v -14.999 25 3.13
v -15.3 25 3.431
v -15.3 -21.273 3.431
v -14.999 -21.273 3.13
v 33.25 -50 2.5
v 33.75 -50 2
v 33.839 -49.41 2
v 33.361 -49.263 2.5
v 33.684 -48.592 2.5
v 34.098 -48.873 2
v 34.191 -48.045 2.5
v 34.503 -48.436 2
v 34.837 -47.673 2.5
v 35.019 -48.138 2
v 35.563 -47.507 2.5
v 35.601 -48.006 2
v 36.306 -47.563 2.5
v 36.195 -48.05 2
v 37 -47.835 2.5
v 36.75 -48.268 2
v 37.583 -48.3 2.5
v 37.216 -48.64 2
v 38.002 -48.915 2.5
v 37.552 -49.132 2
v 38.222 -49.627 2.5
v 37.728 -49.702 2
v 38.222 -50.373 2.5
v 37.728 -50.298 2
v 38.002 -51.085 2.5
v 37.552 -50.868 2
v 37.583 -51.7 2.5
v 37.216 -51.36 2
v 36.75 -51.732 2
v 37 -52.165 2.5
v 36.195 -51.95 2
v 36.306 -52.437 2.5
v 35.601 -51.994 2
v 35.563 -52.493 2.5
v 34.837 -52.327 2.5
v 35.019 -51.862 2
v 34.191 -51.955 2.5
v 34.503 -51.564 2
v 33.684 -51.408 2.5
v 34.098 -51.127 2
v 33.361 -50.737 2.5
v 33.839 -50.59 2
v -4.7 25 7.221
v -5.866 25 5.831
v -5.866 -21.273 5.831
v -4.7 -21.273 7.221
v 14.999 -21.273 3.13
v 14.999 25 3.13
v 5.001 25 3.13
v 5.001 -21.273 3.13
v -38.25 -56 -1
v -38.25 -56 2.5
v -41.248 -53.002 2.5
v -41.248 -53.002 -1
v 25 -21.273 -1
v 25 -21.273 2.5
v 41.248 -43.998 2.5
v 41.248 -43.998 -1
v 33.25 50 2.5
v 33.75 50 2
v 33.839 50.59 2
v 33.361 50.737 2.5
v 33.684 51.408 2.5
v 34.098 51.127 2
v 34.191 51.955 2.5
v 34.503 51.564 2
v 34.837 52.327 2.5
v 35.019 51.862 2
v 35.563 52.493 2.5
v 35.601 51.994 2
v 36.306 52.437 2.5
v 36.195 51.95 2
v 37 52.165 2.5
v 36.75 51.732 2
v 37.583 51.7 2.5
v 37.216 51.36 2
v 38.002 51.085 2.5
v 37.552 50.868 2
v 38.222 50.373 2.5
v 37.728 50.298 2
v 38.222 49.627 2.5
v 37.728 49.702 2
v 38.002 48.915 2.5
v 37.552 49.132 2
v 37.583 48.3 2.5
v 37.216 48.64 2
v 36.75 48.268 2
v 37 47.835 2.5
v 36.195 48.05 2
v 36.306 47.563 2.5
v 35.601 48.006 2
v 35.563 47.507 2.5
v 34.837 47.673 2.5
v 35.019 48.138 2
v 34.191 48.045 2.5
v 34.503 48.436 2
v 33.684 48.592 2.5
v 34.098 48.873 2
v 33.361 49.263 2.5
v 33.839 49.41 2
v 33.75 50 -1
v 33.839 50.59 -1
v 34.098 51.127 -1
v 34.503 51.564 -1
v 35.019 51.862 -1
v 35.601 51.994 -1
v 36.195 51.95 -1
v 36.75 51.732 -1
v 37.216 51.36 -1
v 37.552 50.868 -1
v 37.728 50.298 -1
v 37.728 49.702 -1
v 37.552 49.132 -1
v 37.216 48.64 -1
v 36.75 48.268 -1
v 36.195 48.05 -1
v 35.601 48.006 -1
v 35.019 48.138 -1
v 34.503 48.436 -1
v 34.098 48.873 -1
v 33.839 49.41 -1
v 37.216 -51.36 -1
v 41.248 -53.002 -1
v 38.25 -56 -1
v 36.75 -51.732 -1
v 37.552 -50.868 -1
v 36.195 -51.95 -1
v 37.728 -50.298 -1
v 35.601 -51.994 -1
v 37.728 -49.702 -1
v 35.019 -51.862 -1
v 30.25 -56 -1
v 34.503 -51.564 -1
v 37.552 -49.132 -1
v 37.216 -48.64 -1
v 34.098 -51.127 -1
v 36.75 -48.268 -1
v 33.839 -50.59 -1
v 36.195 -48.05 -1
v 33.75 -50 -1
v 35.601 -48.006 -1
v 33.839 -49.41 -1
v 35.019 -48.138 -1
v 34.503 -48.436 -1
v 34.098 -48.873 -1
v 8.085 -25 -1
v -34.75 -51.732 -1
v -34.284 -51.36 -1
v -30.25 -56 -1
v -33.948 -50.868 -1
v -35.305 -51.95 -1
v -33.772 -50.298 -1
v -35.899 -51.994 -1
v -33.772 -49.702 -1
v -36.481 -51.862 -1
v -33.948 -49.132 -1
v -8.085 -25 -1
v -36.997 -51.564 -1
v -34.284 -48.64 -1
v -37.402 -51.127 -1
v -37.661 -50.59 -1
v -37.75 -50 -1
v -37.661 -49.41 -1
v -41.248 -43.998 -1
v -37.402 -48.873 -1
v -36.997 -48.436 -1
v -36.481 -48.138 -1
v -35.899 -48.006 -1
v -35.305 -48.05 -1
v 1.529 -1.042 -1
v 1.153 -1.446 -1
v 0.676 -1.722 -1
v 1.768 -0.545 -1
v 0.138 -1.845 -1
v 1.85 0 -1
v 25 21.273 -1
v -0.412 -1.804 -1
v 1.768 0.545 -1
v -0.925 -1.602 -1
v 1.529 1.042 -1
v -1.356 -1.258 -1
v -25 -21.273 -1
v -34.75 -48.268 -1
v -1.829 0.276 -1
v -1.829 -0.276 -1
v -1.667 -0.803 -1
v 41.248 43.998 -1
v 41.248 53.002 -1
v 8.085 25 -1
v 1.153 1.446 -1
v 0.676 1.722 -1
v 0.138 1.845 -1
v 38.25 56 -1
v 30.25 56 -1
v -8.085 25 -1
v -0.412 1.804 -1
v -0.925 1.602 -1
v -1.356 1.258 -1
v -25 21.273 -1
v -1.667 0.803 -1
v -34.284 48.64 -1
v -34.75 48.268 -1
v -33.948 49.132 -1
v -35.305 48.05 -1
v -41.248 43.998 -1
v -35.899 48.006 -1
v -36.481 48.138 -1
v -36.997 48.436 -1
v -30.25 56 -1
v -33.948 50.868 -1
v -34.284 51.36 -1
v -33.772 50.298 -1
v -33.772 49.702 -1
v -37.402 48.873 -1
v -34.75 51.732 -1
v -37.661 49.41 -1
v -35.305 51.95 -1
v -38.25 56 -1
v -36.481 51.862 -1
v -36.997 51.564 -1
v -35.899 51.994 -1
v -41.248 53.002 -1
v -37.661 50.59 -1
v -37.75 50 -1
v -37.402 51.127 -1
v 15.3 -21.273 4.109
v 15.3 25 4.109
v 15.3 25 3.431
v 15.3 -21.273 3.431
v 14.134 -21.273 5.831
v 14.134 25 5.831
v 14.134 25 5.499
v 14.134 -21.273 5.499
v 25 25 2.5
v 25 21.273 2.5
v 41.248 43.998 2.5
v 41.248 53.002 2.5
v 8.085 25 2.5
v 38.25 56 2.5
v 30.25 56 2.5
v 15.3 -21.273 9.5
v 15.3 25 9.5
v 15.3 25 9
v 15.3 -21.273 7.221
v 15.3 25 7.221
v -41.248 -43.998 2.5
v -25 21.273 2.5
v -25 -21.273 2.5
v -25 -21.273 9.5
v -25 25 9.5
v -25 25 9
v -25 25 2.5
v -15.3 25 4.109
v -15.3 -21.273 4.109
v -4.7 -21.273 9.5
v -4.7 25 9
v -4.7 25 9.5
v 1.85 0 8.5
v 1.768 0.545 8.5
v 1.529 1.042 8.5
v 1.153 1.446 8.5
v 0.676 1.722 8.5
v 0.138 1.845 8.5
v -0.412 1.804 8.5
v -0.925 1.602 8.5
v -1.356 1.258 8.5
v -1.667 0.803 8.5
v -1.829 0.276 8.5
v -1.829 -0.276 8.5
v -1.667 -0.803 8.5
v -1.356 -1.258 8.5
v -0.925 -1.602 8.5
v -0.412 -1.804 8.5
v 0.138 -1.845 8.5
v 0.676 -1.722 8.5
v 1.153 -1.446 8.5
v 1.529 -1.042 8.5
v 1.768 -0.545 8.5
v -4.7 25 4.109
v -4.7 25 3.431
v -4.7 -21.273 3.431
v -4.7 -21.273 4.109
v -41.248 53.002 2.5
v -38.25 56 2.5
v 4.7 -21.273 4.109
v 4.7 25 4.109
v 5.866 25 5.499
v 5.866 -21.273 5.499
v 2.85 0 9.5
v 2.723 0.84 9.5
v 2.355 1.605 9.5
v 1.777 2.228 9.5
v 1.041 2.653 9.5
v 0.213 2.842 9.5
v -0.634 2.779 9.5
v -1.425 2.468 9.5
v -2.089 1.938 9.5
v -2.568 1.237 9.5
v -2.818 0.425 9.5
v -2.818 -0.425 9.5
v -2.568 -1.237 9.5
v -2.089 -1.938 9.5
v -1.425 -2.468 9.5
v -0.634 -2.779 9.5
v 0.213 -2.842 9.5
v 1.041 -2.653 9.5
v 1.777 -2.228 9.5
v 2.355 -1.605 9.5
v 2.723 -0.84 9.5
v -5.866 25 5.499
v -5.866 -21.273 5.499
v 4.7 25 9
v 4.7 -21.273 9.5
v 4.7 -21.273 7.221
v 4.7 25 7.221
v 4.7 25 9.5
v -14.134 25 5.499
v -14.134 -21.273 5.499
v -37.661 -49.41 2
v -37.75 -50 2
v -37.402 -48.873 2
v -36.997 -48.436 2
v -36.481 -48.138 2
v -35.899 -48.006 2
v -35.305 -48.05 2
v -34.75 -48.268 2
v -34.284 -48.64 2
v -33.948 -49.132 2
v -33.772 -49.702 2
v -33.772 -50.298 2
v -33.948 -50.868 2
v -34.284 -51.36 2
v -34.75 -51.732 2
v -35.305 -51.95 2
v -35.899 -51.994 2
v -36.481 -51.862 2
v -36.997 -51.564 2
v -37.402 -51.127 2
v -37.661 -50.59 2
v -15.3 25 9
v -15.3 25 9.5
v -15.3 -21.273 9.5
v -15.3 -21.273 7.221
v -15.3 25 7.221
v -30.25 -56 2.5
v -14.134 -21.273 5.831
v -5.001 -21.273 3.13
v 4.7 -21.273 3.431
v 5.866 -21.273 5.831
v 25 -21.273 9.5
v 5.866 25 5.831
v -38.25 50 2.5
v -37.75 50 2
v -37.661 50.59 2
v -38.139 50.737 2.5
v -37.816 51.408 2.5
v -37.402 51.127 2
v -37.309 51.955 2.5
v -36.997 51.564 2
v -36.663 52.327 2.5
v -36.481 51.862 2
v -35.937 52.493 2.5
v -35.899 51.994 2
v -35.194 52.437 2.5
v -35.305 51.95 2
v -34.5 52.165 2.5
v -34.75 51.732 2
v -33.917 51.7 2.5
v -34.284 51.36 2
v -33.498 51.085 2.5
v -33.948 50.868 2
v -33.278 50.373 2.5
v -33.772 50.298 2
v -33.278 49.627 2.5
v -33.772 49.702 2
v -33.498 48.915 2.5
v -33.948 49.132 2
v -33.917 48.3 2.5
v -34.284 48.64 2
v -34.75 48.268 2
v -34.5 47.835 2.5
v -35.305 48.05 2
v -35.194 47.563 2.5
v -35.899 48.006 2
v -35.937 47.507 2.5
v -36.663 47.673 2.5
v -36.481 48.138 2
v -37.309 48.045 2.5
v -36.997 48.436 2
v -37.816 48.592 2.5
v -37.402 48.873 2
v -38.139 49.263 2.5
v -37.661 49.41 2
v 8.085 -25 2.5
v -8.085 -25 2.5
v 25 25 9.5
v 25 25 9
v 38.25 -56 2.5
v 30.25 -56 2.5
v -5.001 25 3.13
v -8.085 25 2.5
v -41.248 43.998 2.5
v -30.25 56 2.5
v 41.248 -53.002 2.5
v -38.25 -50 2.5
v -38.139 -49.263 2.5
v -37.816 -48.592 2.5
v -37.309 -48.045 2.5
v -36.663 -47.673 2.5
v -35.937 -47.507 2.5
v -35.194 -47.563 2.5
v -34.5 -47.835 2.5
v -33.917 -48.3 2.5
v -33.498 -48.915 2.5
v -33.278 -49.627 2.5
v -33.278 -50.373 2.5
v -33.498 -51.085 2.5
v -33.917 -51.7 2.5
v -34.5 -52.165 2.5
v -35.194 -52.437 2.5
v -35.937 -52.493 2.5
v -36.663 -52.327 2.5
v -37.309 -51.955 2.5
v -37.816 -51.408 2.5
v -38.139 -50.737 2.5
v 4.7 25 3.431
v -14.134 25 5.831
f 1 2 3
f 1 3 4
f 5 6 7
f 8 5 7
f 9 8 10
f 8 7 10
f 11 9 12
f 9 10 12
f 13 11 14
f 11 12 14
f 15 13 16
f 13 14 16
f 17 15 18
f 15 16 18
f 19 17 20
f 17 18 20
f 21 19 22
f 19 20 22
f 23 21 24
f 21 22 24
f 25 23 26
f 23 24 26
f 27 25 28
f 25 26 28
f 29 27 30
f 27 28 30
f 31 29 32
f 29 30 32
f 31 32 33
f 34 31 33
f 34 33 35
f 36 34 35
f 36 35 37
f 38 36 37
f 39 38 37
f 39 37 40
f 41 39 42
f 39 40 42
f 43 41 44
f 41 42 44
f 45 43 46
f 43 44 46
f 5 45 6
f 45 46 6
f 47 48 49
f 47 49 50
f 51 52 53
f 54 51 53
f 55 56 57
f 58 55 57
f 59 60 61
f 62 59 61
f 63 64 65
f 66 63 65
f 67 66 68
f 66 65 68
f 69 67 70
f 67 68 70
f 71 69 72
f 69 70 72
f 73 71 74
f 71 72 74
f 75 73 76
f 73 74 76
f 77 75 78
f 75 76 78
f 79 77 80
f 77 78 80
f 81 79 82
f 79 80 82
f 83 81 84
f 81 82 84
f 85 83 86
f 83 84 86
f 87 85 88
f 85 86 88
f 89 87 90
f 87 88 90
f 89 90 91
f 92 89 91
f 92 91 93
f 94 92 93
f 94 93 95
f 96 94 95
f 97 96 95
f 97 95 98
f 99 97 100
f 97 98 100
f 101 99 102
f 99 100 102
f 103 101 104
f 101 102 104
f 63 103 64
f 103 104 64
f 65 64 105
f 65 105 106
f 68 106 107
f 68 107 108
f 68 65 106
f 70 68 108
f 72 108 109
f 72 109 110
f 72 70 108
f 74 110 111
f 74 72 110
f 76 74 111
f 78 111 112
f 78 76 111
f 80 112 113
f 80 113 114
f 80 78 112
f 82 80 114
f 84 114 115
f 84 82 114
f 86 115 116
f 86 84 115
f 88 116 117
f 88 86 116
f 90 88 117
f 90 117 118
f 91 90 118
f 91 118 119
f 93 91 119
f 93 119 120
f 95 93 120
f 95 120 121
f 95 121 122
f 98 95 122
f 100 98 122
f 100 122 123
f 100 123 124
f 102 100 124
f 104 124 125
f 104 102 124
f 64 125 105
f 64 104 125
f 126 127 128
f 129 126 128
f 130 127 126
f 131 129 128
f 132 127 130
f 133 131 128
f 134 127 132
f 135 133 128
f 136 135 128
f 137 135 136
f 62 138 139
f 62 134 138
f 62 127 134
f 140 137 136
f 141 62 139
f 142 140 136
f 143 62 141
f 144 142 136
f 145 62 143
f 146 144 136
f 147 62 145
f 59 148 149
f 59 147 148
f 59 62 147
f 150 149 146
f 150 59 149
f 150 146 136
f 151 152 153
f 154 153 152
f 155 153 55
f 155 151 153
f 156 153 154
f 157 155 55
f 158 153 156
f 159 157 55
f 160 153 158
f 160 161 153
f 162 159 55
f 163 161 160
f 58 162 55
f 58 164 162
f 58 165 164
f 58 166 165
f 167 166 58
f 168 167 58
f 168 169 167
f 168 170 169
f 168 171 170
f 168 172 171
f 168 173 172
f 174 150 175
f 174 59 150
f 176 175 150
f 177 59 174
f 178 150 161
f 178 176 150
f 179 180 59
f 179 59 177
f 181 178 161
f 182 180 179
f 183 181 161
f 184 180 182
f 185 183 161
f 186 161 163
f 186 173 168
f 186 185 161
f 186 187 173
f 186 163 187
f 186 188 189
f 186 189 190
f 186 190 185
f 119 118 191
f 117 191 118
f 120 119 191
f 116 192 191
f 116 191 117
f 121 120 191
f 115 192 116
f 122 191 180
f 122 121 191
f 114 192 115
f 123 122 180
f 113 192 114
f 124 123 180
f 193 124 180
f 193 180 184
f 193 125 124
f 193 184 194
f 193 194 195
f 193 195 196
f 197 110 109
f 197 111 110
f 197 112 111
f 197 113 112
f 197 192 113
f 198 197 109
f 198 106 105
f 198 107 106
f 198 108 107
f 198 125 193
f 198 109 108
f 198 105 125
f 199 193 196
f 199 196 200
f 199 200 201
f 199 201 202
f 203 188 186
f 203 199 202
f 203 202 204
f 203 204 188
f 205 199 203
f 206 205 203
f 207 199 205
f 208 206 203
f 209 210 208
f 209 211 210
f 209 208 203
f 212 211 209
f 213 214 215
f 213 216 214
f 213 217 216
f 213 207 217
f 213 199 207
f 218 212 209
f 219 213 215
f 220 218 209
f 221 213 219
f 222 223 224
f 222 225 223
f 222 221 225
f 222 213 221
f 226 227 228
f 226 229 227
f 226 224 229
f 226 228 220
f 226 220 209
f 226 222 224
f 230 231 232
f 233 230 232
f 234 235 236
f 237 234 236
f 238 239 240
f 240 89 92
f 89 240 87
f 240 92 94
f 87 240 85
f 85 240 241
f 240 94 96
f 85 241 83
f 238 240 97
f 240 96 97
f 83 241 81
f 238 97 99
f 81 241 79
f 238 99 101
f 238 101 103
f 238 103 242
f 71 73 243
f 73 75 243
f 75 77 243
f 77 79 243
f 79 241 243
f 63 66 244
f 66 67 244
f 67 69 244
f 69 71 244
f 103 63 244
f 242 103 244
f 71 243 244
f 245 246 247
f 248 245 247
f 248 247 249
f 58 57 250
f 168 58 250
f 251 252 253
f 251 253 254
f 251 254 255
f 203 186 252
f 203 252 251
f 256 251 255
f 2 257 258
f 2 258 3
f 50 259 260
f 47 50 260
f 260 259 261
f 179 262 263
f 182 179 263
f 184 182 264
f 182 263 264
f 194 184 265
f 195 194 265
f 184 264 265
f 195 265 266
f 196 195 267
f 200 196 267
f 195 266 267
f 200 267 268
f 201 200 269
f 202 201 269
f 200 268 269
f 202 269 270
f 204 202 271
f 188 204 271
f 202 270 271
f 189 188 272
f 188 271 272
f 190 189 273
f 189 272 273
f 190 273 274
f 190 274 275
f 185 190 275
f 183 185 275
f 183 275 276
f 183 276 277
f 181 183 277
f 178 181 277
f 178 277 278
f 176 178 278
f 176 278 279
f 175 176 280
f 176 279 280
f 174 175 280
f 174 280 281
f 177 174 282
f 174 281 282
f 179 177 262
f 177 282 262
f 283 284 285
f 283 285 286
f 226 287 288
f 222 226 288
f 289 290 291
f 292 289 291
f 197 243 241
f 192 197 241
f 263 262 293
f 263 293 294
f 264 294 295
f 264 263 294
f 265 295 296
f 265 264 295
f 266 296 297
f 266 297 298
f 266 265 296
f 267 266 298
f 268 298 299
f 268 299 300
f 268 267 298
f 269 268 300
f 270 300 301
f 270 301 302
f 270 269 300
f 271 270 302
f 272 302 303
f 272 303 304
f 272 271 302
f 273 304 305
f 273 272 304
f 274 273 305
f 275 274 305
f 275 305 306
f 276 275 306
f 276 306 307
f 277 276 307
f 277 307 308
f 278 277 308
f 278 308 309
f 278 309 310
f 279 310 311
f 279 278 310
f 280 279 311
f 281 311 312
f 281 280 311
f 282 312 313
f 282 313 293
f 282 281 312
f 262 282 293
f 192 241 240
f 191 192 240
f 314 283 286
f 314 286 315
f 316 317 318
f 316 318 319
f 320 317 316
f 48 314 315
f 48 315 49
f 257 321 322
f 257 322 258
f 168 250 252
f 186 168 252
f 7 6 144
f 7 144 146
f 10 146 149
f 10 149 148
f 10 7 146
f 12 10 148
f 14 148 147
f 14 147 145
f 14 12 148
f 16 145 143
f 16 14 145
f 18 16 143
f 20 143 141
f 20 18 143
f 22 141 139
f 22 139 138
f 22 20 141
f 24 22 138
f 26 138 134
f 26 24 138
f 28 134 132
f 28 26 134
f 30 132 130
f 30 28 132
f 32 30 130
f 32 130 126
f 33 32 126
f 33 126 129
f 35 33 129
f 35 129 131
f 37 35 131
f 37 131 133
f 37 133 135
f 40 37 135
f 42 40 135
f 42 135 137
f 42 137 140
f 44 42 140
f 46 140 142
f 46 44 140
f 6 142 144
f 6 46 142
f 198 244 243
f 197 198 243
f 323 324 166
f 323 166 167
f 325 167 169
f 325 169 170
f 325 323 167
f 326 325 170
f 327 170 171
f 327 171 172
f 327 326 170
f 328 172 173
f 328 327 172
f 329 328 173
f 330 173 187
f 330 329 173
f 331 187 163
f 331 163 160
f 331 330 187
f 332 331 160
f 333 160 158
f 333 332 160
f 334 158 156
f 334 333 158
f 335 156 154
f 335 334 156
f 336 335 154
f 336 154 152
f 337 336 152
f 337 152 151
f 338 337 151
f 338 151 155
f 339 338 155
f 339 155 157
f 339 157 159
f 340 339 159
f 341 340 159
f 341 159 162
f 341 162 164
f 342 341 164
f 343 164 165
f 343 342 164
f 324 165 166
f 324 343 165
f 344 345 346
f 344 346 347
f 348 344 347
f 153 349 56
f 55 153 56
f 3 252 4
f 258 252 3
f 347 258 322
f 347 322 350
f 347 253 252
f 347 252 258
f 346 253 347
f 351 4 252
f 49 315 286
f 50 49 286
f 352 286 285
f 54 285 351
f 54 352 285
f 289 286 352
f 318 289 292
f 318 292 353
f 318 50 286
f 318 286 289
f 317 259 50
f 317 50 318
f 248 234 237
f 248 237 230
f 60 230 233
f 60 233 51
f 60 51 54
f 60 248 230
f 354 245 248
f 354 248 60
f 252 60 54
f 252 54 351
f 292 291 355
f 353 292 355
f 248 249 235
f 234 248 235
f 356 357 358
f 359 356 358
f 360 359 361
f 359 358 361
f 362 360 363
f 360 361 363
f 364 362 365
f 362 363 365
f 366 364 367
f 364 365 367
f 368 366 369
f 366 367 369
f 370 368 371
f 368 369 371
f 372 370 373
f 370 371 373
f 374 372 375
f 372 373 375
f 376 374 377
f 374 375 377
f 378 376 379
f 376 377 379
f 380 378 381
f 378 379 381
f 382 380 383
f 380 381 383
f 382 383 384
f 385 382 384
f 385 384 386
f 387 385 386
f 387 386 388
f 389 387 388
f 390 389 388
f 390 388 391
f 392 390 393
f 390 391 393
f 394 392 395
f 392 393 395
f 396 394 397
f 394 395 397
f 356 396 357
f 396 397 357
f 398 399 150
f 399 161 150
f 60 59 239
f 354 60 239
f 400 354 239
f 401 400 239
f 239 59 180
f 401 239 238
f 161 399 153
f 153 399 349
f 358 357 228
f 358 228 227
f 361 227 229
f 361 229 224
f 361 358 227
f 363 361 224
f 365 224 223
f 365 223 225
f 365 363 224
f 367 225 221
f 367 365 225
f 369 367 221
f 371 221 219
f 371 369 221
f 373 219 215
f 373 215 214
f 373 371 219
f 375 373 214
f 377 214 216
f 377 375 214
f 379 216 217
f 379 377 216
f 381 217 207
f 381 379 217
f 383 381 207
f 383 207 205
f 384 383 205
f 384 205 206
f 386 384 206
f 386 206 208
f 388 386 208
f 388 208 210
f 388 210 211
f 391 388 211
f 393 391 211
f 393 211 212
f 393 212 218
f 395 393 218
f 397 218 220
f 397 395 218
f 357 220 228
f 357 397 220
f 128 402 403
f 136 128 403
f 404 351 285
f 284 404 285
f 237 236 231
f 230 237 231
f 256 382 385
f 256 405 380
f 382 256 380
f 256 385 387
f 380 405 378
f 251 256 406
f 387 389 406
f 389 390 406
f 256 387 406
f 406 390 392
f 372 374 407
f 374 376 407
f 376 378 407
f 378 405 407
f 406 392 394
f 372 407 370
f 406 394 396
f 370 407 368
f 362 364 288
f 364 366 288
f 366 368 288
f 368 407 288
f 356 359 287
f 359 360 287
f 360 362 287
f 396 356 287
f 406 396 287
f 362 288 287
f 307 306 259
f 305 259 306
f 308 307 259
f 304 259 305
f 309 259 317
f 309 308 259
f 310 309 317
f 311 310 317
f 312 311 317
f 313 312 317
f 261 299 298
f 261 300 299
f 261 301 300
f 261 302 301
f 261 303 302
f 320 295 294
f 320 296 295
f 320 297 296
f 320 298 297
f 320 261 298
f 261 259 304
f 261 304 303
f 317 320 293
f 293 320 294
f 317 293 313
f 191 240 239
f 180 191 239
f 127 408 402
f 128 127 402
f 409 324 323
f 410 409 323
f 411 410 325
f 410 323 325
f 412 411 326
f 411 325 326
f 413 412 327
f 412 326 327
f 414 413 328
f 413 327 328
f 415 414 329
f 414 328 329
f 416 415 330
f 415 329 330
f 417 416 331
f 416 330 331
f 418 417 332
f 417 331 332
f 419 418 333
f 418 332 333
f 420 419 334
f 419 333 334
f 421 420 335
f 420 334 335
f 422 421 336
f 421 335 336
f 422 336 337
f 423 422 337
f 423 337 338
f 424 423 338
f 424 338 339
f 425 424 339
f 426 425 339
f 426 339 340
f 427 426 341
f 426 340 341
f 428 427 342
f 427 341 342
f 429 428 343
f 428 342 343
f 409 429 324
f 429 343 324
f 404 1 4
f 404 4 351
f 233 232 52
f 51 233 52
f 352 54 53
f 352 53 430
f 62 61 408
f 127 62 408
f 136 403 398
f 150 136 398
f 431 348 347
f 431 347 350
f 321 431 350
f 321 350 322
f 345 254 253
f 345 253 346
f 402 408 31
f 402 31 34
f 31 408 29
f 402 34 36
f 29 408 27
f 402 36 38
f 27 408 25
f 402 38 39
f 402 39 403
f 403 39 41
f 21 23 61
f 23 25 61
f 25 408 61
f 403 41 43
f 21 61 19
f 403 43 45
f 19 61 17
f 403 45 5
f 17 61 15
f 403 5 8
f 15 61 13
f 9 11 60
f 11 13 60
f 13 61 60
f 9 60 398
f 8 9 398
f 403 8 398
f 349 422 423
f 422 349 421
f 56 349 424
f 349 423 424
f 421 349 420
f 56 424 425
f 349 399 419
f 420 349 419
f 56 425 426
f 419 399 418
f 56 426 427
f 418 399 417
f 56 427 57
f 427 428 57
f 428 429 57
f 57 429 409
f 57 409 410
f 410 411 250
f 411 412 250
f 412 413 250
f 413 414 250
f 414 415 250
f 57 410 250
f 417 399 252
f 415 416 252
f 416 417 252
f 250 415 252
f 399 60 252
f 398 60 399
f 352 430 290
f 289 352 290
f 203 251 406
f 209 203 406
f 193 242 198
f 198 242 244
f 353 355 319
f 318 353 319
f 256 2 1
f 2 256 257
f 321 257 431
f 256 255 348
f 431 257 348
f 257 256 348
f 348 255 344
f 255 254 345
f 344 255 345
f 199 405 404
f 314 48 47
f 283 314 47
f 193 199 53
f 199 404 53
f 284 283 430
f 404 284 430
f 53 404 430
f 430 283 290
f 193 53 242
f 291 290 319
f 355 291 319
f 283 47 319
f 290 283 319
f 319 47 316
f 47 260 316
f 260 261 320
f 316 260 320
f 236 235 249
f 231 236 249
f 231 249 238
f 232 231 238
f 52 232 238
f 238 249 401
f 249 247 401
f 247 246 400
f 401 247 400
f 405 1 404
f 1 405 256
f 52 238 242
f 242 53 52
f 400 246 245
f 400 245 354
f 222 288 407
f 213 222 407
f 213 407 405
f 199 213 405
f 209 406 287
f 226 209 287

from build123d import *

# Parameters (mm, degrees)
SKICA1_W                     = 50
SKICA1_H                     = 50
P_IDAT_VYSUNUT_M1_DEPTH      = 10
ODEBRAT_VYSUNUT_M2_DEPTH     = 57.789083458
P_IDAT_VYSUNUT_M4_DEPTH      = 1
P_IDAT_VYSUNUT_M4_DEPTH_BACK = 2.5
SKICA4_R                     = 2
SKICA4_W                     = 50
SKICA4_H                     = 50
SKICA6_R                     = 1.85
ODEBRAT_VYSUNUT_M3_DEPTH     = 71.416176377
SKICA7_W                     = 50
SKICA7_H                     = 1
ODEBRAT_VYSUNUT_M4_DEPTH     = 92.446366224
SKICA9_W                     = 6.5
SKICA9_H                     = 3.727272727
ODEBRAT_VYSUNUT_M6_DEPTH     = 88.211595424
ZKOSEN_2_SIZE                = 0.5
P_IDAT_START                 = 0.5
SKICA10_W                    = 9.4
SKICA10_H                    = 46.272727273
SKICA10_R                    = 1.85
SKICA10_W_2                  = 9.7
P_IDAT_VYSUNUT_M5_DEPTH      = 0.5
ZKOSEN_3_SIZE                = 1


with BuildPart() as part:
    # Skica1 → Přidat vysunutím1 (new body)
    with BuildSketch(Plane.XY):
        Rectangle(SKICA1_W, SKICA1_H)
    extrude(amount=P_IDAT_VYSUNUT_M1_DEPTH)

    # Skica3 → Odebrat vysunutím2 (cut, through all)
    with BuildSketch(Plane(origin=(0, 25, 0), x_dir=(1, 0, 0), z_dir=(0, 1, 0))):
        Polygon((-15.3, -10), (-15.3, -7.22080893), (-14.133651513, -5.83080893), (-14.133651513, -5.49919107), (-15.3, -4.10919107), (-15.3, -3.430543964), (-14.999456036, -3.13), (-5.000543964, -3.13), (-4.7, -3.430543964), (-4.7, -4.10919107), (-5.866348487, -5.49919107), (-5.866348487, -5.83080893), (-4.7, -7.22080893), (-4.7, -10), align=None)
        Polygon((15.3, -3.430543964), (14.999456036, -3.13), (5.000543964, -3.13), (4.7, -3.430543964), (4.7, -4.10919107), (5.866348487, -5.49919107), (5.866348487, -5.83080893), (4.7, -7.22080893), (4.7, -10), (15.3, -10), (15.3, -7.22080893), (14.133651513, -5.83080893), (14.133651513, -5.49919107), (15.3, -4.10919107), align=None)
    extrude(amount=-ODEBRAT_VYSUNUT_M2_DEPTH, mode=Mode.SUBTRACT)

    # Skica4 → Přidat vysunutím4 (add, two sides: drawn at the far end of the back side and taken through both)
    # profile 1 of 5: a face of its own
    with BuildSketch(Plane(origin=(0, 0, 0), x_dir=(-1, 0, 0), z_dir=(0, 0, -1)).offset(-P_IDAT_VYSUNUT_M4_DEPTH_BACK)):
        Polygon((-30.25, -56), (-8.085, -25), (-25, -25), (-25, -21.272727273), (-41.248489616, -43.997887574), (-41.248489616, -46.002224154), (-41.248489616, -53.002224154), (-38.25, -56), align=None)
        with Locations((-35.75, -50)):
            Circle(SKICA4_R, mode=Mode.SUBTRACT)
    # profile 2 of 5: a face of its own
    with BuildSketch(Plane(origin=(0, 0, 0), x_dir=(-1, 0, 0), z_dir=(0, 0, -1)).offset(-P_IDAT_VYSUNUT_M4_DEPTH_BACK)):
        Rectangle(SKICA4_W, SKICA4_H)
    # profile 3 of 5: a face of its own
    with BuildSketch(Plane(origin=(0, 0, 0), x_dir=(-1, 0, 0), z_dir=(0, 0, -1)).offset(-P_IDAT_VYSUNUT_M4_DEPTH_BACK)):
        Polygon((-25, 25), (-8.085, 25), (-30.25, 56), (-38.25, 56), (-41.248489616, 53.002224154), (-41.248489616, 46.002224154), (-41.248489616, 43.997887574), (-25, 21.272727273), align=None)
        with Locations((-35.75, 50)):
            Circle(SKICA4_R, mode=Mode.SUBTRACT)
    # profile 4 of 5: a face of its own
    with BuildSketch(Plane(origin=(0, 0, 0), x_dir=(-1, 0, 0), z_dir=(0, 0, -1)).offset(-P_IDAT_VYSUNUT_M4_DEPTH_BACK)):
        Polygon((41.248489616, 46.002224154), (41.248489616, 53.002224154), (38.25, 56), (30.25, 56), (8.085, 25), (25, 25), (25, 21.272727273), (41.248489616, 43.997887574), align=None)
        with Locations((35.75, 50)):
            Circle(SKICA4_R, mode=Mode.SUBTRACT)
    # profile 5 of 5: a face of its own
    with BuildSketch(Plane(origin=(0, 0, 0), x_dir=(-1, 0, 0), z_dir=(0, 0, -1)).offset(-P_IDAT_VYSUNUT_M4_DEPTH_BACK)):
        Polygon((41.248489616, -43.997887574), (25, -21.272727273), (25, -25), (8.085, -25), (30.25, -56), (38.25, -56), (41.248489616, -53.002224154), (41.248489616, -46.002224154), align=None)
        with Locations((35.75, -50)):
            Circle(SKICA4_R, mode=Mode.SUBTRACT)
    extrude(amount=P_IDAT_VYSUNUT_M4_DEPTH + P_IDAT_VYSUNUT_M4_DEPTH_BACK)

    # Skica6 → Odebrat vysunutím3 (cut, through all)
    with BuildSketch(Plane.XY.offset(10)):
        Circle(SKICA6_R)
    extrude(amount=-ODEBRAT_VYSUNUT_M3_DEPTH, mode=Mode.SUBTRACT)

    # Skica7 → Odebrat vysunutím4 (cut, through all)
    with BuildSketch(Plane(origin=(0, 25, 0), x_dir=(1, 0, 0), z_dir=(0, 1, 0))):
        with Locations((0, -9.5)):
            Rectangle(SKICA7_W, SKICA7_H)
    extrude(amount=-ODEBRAT_VYSUNUT_M4_DEPTH, mode=Mode.SUBTRACT)

    # Skica9 → Odebrat vysunutím6 (cut, through all)
    with BuildSketch(Plane(origin=(25, 0, 0), x_dir=(0, 0, -1), z_dir=(1, 0, 0))):
        with Locations((-5.75, -23.136363637)):
            Rectangle(SKICA9_W, SKICA9_H)
    extrude(amount=-ODEBRAT_VYSUNUT_M6_DEPTH, mode=Mode.SUBTRACT)

    # Zkosení2
    zkosen_2_edges = [part.edges().sort_by_distance(p)[0] for p in [
        (-33.75, 50, 2.5),
        (37.75, -50, 2.5),
        (-33.75, -50, 2.5),
        (37.75, 50, 2.5),
    ]]
    chamfer(zkosen_2_edges, length=ZKOSEN_2_SIZE)

    # Skica10 → Přidat vysunutím5 (add)
    # profile 1 of 3: a face of its own
    with BuildSketch(Plane.XY.offset(9).offset(P_IDAT_START)):
        with Locations((0, 1.863636363)):
            Rectangle(SKICA10_W, SKICA10_H)
        Circle(SKICA10_R, mode=Mode.SUBTRACT)
    # profile 2 of 3: a face of its own
    with BuildSketch(Plane.XY.offset(9).offset(P_IDAT_START)):
        with Locations((-20.15, 1.863636363)):
            Rectangle(SKICA10_W_2, SKICA10_H)
    # profile 3 of 3: a face of its own
    with BuildSketch(Plane.XY.offset(9).offset(P_IDAT_START)):
        with Locations((20.15, 1.863636363)):
            Rectangle(SKICA10_W_2, SKICA10_H)
    extrude(amount=-P_IDAT_VYSUNUT_M5_DEPTH)

    # Zkosení3
    zkosen_3_edges = [part.edges().sort_by_distance(p)[0] for p in [
        (-1.85, 0, 9.5),
    ]]
    chamfer(zkosen_3_edges, length=ZKOSEN_3_SIZE)


solid = part.part
